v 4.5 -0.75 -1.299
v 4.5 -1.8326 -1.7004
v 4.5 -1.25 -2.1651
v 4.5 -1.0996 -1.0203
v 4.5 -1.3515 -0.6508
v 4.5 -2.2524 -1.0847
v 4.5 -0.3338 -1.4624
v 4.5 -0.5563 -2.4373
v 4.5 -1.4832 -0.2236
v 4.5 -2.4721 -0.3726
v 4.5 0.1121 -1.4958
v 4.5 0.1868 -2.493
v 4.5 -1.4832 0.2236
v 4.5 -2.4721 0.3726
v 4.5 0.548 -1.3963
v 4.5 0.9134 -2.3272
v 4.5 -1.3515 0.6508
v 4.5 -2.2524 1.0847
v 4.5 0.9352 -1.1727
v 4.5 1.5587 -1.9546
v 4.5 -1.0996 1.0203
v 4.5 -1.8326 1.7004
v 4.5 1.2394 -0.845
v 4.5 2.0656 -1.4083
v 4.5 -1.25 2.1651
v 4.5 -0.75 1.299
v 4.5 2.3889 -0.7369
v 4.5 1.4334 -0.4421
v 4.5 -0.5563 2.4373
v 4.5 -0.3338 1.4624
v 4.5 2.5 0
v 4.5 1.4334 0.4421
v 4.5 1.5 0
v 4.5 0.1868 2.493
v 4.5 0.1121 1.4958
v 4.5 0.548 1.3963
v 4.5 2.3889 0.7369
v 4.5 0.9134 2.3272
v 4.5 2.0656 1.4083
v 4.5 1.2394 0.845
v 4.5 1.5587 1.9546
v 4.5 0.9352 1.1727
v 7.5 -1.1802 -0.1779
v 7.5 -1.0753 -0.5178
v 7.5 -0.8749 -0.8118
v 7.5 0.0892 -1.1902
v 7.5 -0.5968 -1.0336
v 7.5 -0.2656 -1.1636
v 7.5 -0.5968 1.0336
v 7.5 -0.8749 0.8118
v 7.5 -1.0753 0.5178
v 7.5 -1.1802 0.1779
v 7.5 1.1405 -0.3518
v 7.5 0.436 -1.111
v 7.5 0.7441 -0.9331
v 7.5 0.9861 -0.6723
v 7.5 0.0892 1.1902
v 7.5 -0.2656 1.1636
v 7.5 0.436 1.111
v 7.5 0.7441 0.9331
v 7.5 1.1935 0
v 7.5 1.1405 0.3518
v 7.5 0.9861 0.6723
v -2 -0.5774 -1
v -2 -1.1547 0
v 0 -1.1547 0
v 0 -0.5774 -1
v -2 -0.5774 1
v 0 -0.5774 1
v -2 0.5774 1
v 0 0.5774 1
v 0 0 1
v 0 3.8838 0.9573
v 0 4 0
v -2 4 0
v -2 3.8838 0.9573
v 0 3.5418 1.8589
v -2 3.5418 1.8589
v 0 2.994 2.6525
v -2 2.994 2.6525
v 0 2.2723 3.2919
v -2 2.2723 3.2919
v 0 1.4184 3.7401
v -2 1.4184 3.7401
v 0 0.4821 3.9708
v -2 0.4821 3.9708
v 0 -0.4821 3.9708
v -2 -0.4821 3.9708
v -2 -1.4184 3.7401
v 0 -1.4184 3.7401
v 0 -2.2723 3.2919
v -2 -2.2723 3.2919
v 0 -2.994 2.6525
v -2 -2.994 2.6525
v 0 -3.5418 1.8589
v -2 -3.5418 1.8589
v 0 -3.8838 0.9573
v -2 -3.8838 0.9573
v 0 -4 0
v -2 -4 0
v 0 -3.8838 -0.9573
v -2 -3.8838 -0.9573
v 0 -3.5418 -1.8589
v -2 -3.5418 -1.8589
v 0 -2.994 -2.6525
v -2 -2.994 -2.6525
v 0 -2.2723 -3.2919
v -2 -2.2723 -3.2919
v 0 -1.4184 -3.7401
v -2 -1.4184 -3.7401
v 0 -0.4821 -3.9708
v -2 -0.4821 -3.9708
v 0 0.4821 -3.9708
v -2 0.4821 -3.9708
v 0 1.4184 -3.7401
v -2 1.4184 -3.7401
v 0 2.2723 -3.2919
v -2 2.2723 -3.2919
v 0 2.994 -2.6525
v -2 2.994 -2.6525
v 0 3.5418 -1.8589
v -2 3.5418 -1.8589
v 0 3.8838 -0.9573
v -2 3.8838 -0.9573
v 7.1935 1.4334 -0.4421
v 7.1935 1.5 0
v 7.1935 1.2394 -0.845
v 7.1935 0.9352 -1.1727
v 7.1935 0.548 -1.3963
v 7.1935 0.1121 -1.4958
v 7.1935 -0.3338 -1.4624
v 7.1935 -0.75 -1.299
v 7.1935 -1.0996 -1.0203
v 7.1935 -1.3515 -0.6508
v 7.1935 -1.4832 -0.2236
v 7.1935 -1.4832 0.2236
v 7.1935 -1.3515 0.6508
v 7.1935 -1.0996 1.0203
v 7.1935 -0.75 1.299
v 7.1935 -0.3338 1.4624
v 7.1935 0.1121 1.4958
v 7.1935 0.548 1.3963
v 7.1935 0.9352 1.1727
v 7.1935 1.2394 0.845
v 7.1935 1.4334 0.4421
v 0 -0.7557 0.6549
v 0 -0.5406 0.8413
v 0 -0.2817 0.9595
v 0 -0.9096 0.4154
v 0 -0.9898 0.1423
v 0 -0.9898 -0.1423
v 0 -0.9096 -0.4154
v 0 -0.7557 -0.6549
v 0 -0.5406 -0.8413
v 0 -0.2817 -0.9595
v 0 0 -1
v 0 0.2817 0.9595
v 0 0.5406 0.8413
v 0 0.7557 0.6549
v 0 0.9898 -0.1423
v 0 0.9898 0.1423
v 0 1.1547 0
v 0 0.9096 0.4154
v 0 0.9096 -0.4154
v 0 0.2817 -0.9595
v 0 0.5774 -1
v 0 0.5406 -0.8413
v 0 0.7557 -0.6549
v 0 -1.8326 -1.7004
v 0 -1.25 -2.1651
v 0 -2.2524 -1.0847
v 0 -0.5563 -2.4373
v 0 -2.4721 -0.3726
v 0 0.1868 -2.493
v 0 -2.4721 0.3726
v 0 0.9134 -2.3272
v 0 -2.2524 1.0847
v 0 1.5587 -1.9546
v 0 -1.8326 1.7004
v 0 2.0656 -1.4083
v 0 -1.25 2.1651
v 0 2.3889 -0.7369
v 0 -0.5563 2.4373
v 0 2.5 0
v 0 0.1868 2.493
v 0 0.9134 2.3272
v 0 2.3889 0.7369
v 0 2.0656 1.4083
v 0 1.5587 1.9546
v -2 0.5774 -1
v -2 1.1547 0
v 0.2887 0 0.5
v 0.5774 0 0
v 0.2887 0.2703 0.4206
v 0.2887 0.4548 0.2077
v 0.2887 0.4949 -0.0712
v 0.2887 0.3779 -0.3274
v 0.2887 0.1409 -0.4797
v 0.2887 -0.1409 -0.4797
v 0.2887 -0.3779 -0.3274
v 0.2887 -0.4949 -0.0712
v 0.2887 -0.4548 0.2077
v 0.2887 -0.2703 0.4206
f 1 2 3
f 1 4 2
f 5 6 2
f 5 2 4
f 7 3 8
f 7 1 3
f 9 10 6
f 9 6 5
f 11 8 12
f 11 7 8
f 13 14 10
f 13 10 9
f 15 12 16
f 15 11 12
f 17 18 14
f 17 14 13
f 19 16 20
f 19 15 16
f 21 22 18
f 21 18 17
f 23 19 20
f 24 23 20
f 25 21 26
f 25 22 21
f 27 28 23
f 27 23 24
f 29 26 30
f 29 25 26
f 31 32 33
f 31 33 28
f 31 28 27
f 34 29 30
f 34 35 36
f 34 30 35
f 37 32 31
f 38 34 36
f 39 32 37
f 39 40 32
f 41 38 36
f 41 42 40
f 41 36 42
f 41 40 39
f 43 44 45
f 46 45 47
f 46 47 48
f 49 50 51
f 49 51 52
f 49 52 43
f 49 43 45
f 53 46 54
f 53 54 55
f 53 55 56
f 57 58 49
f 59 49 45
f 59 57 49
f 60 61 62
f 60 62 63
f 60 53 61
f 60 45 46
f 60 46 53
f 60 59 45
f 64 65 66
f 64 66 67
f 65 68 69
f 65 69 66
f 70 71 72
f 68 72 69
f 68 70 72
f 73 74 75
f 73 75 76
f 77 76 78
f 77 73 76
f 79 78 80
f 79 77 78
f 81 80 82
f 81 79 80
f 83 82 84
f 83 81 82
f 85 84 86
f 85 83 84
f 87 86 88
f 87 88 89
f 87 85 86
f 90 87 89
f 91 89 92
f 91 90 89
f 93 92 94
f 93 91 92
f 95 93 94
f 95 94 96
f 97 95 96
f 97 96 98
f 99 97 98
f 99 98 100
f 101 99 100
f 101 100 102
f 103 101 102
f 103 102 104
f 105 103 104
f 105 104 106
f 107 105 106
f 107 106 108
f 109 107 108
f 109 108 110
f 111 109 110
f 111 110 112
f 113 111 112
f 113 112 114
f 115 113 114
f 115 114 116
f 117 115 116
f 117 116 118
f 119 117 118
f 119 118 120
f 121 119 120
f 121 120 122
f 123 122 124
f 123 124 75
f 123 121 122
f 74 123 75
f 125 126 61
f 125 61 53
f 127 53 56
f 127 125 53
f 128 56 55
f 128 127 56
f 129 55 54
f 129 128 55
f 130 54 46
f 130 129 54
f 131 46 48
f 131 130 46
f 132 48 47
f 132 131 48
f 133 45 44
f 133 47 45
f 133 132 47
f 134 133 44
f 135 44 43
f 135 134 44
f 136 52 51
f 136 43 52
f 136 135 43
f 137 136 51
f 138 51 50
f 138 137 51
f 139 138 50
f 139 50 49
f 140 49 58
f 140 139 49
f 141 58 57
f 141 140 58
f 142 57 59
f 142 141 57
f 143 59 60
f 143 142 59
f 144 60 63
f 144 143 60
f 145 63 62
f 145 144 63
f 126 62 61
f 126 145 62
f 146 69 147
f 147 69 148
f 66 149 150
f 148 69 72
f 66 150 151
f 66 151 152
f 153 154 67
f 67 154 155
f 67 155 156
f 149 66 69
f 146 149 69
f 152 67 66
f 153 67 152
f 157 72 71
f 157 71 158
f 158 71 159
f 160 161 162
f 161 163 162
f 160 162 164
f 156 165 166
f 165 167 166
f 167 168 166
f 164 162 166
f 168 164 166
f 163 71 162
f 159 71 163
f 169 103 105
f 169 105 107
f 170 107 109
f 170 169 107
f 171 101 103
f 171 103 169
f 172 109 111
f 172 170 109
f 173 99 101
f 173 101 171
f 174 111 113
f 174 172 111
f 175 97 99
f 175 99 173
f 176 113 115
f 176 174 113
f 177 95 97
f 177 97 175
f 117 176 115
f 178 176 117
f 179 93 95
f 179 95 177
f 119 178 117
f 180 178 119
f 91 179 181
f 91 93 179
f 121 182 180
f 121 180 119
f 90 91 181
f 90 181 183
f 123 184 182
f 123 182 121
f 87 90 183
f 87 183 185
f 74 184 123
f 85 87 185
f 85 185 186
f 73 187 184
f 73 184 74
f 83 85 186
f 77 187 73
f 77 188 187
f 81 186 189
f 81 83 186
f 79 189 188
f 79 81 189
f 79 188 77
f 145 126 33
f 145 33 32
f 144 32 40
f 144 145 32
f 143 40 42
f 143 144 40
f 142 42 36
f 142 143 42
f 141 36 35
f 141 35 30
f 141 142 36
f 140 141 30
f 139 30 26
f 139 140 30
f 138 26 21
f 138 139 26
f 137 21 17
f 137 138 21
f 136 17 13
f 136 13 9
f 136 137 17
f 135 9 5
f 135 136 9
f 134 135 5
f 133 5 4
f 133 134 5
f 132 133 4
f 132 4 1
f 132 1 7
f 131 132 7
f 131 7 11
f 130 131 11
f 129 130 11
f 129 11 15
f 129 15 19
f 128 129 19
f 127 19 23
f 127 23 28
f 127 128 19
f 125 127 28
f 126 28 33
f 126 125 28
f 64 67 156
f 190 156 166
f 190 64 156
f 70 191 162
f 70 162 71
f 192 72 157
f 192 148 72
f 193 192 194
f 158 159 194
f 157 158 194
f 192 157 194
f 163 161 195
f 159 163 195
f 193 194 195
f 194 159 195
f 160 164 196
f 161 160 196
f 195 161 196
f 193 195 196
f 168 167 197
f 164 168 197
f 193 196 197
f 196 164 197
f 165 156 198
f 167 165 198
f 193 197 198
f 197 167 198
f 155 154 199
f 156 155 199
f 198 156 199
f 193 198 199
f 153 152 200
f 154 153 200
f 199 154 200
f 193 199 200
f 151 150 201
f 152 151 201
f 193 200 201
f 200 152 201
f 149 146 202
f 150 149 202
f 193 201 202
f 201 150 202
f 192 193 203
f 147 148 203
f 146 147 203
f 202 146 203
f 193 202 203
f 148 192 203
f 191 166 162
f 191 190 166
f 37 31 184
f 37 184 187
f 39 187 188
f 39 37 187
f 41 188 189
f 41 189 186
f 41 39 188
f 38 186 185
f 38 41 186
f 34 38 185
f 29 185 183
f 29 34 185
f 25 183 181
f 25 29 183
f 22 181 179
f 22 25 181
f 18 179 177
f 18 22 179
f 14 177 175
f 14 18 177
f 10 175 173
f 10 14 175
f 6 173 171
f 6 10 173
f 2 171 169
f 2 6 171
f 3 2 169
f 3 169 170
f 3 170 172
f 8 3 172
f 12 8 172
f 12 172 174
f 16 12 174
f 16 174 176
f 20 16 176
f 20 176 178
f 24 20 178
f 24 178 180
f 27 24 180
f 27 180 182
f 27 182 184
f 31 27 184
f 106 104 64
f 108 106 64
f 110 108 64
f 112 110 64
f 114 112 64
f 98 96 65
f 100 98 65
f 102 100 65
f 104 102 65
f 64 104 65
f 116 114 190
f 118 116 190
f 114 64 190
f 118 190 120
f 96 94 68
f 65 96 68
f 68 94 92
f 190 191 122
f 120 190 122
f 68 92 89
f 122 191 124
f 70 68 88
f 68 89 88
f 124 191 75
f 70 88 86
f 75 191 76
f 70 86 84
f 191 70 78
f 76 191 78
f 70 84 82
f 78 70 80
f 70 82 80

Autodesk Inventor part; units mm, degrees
ref_plane "YZ Plane" through (0, 0, 0) normal (1, 0, 0) x (0, 1, 0)
ref_plane "XZ Plane" through (0, 0, 0) normal (0, 1, 0) x (-1, 0, 0)
ref_plane "XY Plane" through (0, 0, 0) normal (0, 0, 1) x (1, 0, 0)
sketch "Sketch_1" plane through (0, 0, 0) normal (0, 0, 1) x (1, 0, 0)
  line L0 (4.5, 0) -> (-2, 0)
  line L1 (-2, 0) -> (-2, 4)
  line L2 (-2, 4) -> (0, 4)
  line L3 (0, 4) -> (0, 2.5)
  line L4 (0, 2.5) -> (4.5, 2.5)
  line L5 (4.5, 2.5) -> (4.5, 0)
  line L6 (4.5, 0) -> (-2, 0)
revolve "Revolution1" add sketch "Sketch_1" angle 360 about axis through (4.5, 0, 0) along (1, 0, 0)
sketch "Sketch2" plane through (-2, 0, 0) normal (-1, 0, 0) x (0, 0, 1)
  point P0 (0, 0)
hole "Hole1" at (-2, 0, 0) direction (1, 0, 0) diameter 2 depth 2 tip angle 120
sketch "Sketch_3" plane through (-2, 0, 0) normal (1, 0, 0) x (0, 0, -1)
  line L0 (-1, -0.5774) -> (0, -1.1547)
  line L1 (0, -1.1547) -> (1, -0.5774)
  line L2 (1, -0.5774) -> (1, 0.5774)
  line L3 (1, 0.5774) -> (0, 1.1547)
  line L4 (0, 1.1547) -> (-1, 0.5774)
  line L5 (-1, 0.5774) -> (-1, -0.5774)
extrude "Extrusion1" cut sketch "Sketch_3" along normal blind 2
sketch "Sketch_6" plane through (0, 0, 0) normal (0, 0, 1) x (1, 0, 0)
  line L0 (7.5, 0) -> (4.5, 0)
  line L1 (4.5, 0) -> (4.5, 1.5)
  line L2 (4.5, 1.5) -> (7.1935, 1.5)
  line L3 (7.1935, 1.5) -> (7.5, 1.1935)
  line L4 (7.5, 1.1935) -> (7.5, 0)
  line L5 (7.5, 0) -> (4.5, 0)
revolve "Revolution2" add sketch "Sketch_6" angle 360 about axis through (7.5, 0, 0) along (1, 0, 0)
thread "Thread1" size "M3x0.5" class "6g" standard "ISO Metric profile" length 1.6935
properties part number "DBTS3-4.5-3-LTC"
